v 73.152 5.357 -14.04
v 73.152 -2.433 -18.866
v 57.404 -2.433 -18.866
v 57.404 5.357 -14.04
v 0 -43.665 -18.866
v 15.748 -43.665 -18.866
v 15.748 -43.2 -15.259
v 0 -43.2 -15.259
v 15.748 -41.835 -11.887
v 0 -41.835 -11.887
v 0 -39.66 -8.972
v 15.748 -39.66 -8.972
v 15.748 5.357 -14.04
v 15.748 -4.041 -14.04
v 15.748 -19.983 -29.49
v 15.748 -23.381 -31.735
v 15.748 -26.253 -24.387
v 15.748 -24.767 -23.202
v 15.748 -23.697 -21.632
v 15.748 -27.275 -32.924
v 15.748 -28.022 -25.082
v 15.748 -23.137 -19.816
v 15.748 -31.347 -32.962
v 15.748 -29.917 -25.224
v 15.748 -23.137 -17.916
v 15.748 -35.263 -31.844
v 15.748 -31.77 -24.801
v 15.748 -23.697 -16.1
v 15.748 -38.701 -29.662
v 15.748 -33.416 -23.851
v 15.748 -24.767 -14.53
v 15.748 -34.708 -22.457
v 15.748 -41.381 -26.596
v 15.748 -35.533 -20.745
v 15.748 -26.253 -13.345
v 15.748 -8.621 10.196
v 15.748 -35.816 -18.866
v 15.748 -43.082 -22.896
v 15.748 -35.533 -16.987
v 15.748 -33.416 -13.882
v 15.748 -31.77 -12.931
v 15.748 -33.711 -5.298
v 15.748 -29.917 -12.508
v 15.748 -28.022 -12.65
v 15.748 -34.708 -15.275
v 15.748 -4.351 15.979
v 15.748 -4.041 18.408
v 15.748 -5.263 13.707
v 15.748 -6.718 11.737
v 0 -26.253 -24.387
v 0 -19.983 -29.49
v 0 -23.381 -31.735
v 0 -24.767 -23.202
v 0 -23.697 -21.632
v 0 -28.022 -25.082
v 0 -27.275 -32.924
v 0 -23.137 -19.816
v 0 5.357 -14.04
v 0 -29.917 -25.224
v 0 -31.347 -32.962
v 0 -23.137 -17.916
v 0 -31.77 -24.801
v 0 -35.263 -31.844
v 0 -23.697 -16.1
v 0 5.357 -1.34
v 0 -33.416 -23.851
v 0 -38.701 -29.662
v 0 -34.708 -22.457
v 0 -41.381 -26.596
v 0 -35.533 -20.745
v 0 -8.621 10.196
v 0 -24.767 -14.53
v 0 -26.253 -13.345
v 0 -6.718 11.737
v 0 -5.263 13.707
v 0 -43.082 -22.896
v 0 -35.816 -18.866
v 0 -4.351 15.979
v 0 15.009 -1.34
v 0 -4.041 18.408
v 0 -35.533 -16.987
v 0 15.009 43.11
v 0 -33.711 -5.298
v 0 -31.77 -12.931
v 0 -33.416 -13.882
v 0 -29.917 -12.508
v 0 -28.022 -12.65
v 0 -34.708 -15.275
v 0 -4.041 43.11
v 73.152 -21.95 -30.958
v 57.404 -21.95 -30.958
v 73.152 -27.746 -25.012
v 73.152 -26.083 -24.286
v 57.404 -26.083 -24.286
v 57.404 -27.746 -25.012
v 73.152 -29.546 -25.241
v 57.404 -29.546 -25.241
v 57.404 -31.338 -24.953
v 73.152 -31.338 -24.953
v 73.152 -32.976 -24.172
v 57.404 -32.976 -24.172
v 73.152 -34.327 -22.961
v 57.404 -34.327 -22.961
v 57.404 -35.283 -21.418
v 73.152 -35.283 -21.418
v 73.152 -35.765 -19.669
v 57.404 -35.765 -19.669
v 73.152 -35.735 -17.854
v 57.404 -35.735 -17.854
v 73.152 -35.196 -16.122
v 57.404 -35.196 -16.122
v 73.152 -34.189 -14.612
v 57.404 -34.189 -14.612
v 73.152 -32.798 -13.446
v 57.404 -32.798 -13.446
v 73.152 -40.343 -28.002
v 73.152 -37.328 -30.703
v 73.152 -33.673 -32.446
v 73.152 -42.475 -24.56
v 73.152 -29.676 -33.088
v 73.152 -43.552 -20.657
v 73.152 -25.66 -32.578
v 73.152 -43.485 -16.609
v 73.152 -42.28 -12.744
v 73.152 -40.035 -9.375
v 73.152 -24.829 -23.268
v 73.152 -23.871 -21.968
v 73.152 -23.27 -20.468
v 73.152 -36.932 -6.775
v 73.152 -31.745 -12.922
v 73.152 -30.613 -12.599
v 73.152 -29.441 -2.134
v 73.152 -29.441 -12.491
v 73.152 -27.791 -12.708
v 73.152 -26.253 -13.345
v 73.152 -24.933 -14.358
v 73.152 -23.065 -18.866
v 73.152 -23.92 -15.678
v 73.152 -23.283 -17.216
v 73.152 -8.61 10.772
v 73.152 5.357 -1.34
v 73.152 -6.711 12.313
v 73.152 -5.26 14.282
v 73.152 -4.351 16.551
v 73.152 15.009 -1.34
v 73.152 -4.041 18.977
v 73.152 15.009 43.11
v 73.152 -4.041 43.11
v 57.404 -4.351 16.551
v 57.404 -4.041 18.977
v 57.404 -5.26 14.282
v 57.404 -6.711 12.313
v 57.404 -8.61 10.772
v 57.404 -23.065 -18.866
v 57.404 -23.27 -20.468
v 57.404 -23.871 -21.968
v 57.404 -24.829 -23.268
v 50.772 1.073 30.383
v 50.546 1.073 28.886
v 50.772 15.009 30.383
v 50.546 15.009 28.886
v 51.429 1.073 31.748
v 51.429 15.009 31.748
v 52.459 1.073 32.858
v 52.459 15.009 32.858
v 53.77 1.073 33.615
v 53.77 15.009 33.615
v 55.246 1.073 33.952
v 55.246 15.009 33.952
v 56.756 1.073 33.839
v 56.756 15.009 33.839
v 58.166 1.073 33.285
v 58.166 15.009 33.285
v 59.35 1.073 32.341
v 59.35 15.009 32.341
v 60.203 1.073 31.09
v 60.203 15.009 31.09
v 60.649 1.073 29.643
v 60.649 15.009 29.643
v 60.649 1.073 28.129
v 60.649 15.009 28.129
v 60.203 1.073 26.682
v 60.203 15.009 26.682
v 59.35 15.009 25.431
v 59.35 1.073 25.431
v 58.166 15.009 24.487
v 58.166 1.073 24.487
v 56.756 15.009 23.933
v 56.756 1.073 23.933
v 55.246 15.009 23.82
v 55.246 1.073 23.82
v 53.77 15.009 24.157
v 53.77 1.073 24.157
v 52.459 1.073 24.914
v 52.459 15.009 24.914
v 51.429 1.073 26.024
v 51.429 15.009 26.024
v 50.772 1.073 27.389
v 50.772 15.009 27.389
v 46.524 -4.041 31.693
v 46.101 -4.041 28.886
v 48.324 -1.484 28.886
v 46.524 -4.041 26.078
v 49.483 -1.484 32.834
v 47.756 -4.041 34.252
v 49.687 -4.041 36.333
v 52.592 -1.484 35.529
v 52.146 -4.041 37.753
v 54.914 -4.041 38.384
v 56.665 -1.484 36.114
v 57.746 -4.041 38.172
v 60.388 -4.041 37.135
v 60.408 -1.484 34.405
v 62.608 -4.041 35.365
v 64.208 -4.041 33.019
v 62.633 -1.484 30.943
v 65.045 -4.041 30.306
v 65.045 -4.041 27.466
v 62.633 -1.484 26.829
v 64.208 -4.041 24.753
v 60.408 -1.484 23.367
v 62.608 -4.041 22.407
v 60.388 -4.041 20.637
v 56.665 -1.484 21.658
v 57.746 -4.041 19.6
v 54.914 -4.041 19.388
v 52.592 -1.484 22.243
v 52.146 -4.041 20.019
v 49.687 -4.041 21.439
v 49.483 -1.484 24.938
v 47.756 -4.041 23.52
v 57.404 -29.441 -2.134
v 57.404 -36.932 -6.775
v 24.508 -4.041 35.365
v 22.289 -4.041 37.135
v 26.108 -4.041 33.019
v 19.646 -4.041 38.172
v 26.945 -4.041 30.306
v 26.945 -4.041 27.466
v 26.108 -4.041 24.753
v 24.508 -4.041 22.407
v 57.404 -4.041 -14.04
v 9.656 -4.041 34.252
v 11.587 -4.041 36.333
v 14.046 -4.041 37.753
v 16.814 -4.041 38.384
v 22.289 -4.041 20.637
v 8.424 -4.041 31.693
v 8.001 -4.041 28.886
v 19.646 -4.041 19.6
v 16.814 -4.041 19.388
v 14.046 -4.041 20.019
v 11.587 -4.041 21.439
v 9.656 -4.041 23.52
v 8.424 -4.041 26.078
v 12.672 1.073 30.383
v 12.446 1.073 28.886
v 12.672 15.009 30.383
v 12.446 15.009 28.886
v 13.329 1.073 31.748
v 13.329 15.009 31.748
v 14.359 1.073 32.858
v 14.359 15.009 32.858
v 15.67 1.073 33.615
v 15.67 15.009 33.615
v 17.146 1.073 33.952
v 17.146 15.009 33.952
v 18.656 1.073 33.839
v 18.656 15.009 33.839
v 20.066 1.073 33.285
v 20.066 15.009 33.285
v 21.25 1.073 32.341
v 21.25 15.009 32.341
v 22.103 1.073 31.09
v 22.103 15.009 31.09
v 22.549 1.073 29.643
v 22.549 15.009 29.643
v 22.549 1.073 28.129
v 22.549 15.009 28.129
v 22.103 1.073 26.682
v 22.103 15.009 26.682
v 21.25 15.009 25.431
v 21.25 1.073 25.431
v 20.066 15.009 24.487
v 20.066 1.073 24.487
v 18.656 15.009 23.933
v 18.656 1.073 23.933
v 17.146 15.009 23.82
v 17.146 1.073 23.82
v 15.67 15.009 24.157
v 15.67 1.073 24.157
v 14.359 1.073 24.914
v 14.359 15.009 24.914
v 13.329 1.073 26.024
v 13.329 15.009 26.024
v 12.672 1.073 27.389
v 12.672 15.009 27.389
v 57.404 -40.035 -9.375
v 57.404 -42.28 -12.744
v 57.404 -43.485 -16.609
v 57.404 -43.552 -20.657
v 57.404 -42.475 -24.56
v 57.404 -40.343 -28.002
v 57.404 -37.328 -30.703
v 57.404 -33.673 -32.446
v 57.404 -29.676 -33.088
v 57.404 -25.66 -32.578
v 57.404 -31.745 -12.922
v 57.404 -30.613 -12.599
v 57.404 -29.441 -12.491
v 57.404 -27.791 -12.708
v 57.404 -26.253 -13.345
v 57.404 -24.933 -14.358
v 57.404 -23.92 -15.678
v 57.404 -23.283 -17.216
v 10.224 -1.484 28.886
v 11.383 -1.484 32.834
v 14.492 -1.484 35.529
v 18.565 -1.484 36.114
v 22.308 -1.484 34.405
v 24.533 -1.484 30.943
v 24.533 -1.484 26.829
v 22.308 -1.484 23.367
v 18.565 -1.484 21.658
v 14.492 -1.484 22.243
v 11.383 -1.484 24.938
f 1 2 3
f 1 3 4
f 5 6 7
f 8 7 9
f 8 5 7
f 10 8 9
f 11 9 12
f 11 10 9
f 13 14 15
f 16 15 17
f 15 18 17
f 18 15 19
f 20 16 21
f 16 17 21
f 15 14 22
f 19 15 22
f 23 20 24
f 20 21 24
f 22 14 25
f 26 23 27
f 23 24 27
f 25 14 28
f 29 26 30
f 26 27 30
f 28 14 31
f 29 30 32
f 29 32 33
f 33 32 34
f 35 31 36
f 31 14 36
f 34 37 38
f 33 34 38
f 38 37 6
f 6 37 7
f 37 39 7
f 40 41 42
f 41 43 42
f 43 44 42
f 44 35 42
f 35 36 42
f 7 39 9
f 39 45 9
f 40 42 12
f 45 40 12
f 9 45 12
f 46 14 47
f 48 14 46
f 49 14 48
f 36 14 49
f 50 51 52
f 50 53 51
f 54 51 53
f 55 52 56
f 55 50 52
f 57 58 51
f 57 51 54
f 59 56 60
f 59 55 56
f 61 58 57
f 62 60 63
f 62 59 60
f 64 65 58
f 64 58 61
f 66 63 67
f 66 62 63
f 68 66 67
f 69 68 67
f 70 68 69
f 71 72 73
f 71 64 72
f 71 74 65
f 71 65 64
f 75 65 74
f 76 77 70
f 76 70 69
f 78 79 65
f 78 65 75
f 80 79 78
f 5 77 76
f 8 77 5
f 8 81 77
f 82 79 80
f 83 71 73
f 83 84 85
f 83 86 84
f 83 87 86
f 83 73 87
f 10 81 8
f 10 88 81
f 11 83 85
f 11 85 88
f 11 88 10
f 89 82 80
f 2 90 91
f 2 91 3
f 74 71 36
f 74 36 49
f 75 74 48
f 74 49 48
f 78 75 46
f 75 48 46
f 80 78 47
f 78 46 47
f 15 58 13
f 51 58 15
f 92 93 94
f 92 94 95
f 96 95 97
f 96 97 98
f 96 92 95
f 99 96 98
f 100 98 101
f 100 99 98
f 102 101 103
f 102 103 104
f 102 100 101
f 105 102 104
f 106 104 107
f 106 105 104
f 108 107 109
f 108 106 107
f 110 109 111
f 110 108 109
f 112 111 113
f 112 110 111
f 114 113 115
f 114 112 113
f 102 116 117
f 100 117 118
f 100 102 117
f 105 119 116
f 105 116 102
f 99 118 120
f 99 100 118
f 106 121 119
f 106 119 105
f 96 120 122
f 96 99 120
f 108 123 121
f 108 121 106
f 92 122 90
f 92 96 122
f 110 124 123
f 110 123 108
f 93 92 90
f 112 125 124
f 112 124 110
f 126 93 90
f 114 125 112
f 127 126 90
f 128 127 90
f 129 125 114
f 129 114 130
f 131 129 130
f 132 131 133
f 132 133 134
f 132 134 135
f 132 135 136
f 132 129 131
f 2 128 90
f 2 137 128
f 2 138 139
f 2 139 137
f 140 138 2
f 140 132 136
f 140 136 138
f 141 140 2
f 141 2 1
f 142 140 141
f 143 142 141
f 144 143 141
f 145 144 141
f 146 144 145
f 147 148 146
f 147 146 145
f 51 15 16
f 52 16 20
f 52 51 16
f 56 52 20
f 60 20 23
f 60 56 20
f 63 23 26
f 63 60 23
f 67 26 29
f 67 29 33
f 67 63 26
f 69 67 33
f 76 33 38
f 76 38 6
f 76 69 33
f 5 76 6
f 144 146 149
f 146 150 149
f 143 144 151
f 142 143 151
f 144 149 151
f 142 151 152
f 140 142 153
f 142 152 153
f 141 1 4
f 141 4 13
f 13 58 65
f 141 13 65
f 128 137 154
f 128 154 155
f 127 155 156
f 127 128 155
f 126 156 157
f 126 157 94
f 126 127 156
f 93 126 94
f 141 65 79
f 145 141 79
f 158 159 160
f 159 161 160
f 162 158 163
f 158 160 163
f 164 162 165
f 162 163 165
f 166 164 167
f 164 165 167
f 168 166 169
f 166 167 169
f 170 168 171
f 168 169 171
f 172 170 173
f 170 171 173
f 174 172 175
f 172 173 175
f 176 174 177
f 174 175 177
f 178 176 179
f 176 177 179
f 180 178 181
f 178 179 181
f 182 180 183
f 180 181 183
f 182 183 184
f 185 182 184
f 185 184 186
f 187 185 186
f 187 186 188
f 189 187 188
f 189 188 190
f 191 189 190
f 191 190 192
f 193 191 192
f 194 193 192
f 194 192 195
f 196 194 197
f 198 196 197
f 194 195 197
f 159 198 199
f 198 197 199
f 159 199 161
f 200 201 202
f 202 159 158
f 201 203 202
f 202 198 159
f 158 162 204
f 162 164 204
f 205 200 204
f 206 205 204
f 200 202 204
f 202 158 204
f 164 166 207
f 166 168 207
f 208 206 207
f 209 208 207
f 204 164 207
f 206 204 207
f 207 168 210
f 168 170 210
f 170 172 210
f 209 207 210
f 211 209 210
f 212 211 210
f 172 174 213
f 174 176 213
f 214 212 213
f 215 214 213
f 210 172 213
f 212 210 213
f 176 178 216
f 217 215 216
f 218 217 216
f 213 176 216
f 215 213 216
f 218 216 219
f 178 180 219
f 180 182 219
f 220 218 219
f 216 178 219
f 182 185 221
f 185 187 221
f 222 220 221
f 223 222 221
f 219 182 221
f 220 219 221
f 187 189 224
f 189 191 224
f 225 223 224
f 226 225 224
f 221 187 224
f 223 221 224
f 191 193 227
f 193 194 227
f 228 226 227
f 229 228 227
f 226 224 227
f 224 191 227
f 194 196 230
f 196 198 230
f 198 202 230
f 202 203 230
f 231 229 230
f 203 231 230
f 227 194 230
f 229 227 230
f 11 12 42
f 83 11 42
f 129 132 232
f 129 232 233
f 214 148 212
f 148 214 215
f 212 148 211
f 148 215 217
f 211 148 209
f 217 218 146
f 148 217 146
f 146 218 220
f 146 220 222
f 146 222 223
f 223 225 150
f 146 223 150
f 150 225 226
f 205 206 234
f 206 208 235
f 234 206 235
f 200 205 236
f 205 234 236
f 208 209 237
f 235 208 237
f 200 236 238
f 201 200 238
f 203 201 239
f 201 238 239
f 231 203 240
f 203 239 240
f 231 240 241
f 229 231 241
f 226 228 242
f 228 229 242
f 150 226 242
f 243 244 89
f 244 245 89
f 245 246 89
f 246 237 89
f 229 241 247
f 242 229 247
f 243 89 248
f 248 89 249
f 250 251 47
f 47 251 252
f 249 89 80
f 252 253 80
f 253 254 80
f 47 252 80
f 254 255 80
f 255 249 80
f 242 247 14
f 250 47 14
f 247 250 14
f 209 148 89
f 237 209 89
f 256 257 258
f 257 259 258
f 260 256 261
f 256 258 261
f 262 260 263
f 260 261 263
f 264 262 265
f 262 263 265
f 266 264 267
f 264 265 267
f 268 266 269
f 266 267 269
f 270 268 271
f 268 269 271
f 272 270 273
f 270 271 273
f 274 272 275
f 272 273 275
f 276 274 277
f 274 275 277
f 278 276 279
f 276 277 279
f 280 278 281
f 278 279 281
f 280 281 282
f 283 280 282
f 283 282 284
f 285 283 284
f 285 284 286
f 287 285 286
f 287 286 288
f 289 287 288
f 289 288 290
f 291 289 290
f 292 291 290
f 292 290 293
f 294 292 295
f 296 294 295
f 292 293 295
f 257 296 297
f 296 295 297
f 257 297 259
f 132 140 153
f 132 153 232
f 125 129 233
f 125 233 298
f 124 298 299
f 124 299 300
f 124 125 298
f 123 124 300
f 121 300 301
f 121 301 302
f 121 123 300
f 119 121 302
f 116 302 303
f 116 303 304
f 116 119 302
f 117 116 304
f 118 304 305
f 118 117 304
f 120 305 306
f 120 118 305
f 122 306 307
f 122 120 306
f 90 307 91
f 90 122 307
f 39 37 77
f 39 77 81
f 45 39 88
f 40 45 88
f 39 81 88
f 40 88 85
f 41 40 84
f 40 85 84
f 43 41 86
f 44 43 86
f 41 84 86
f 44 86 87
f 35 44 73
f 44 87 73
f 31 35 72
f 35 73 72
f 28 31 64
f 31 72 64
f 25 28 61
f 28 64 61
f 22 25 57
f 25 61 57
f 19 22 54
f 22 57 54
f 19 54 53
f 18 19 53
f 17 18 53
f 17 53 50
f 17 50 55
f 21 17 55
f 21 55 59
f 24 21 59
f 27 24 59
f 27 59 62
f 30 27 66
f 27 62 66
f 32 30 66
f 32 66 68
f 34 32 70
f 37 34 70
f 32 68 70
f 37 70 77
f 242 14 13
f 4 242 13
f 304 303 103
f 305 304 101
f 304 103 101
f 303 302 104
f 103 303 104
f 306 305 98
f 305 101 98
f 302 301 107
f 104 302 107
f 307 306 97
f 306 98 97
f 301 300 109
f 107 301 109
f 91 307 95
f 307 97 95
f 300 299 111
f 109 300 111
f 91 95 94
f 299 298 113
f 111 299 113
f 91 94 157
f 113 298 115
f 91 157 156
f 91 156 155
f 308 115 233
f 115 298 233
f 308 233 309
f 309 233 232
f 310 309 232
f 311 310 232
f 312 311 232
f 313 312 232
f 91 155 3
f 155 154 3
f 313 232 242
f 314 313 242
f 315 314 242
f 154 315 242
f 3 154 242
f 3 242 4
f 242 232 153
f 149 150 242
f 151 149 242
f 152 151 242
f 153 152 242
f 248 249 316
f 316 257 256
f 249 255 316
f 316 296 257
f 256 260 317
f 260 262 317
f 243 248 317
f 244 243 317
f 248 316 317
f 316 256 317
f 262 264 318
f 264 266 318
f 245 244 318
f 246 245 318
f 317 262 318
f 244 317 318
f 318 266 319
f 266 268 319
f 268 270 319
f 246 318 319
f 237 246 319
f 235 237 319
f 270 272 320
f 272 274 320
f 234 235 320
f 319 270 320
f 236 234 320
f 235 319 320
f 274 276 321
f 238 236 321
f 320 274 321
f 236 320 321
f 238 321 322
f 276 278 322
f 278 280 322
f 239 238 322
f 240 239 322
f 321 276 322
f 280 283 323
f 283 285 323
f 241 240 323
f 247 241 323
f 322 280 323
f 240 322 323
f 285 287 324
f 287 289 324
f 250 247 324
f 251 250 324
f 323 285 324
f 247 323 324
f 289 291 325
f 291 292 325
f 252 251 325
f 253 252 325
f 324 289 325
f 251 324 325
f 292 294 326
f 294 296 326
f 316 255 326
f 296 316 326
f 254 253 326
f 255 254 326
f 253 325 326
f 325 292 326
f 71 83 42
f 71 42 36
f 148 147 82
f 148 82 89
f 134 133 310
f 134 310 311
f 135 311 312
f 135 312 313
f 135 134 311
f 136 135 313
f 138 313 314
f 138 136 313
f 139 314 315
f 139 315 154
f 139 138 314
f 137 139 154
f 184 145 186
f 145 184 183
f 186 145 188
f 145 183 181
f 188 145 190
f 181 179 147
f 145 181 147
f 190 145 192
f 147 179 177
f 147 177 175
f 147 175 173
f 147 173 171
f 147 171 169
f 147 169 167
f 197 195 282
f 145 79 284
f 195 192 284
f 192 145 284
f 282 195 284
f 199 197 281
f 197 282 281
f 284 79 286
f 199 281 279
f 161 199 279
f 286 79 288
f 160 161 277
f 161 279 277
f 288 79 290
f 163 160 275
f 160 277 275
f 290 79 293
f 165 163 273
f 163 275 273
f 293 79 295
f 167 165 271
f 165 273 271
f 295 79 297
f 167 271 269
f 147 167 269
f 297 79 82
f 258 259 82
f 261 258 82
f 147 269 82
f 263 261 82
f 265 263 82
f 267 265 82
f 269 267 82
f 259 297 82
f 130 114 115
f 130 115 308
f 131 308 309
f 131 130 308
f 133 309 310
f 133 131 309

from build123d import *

# Parameters (mm, degrees)
F1_DEPTH       = 73.152
F4_D           = 10.16
F4_CSINK_D     = 19.05
F4_CSINK_ANGLE = 82
F6_DEPTH       = 15.748
F7_R           = 6.3754
F8_DEPTH       = 15.748
F9_R           = 9.652


with BuildPart() as f1:
    # F0 (on Right) → F1 (new body)
    with BuildSketch(Plane.YZ):
        Polygon((15.0091618985, 43.1099530668), (-4.0408381015, 43.1099530668), (-4.0408381015, -14.0400469332), (5.3571618985, -14.0400469332), (5.3571618985, -1.3400469332), (15.0091618985, -1.3400469332), align=None)
    extrude(amount=F1_DEPTH)

    # F4 (through all)
    with Locations(Plane.XZ.offset(4.0408381015)):
        with Locations((17.526, 28.8859530668), (55.626, 28.8859530668)):
            CounterSinkHole(F4_D / 2, F4_CSINK_D / 2, counter_sink_angle=F4_CSINK_ANGLE)

    # F5 (on face) → F6 (join)
    with BuildSketch(Plane.YZ.offset(73.152)):
        with BuildLine():
            Line((-21.9497195355, -30.9575860672), (-2.432565009, -18.8660469332))
            Line((-2.432565009, -18.8660469332), (-15.2168381015, -18.8660469332))
            ThreePointArc((-15.2168381015, -18.8660469332), (-17.0135325512, -25.7858917839), (-21.9497195355, -30.9575860672))
        make_face()
        with BuildLine():
            Line((-29.4408381015, -4.6420469332), (-29.4408381015, -2.1335057937))
            Line((-29.4408381015, -2.1335057937), (-36.9319566675, -6.7745077991))
            ThreePointArc((-36.9319566675, -6.7745077991), (-33.3352009093, -5.1855456879), (-29.4408381015, -4.6420469332))
        make_face()
        with BuildLine():
            Line((-32.7984644588, -13.446446357), (-36.9319566675, -6.7745077991))
            ThreePointArc((-36.9319566675, -6.7745077991), (-41.5323772355, -26.3571654992), (-21.9497195355, -30.9575860672))
            Line((-21.9497195355, -30.9575860672), (-26.0832117442, -24.2856475093))
            ThreePointArc((-26.0832117442, -24.2856475093), (-34.8604386776, -22.2236732904), (-32.7984644588, -13.446446357))
        make_face()
        with BuildLine():
            ThreePointArc((-21.9497195355, -30.9575860672), (-17.0135325512, -25.7858917839), (-15.2168381015, -18.8660469332))
            Line((-15.2168381015, -18.8660469332), (-23.0654381015, -18.8660469332))
            ThreePointArc((-23.0654381015, -18.8660469332), (-23.8707422209, -21.9676202502), (-26.0832117442, -24.2856475093))
            Line((-26.0832117442, -24.2856475093), (-21.9497195355, -30.9575860672))
        make_face()
        with BuildLine():
            Line((-29.4408381015, -12.4906469332), (-29.4408381015, -4.6420469332))
            ThreePointArc((-29.4408381015, -4.6420469332), (-33.3352009093, -5.1855456879), (-36.9319566675, -6.7745077991))
            Line((-36.9319566675, -6.7745077991), (-32.7984644588, -13.446446357))
            ThreePointArc((-32.7984644588, -13.446446357), (-31.1863471457, -12.7342508393), (-29.4408381015, -12.4906469332))
        make_face()
        with BuildLine():
            Line((-4.0408381015, -14.0400469332), (-4.0408381015, 13.602655622))
            Line((-4.0408381015, 13.602655622), (-29.4408381015, -2.1335057937))
            Line((-29.4408381015, -2.1335057937), (-29.4408381015, -4.6420469332))
            ThreePointArc((-29.4408381015, -4.6420469332), (-19.3829512459, -8.8081600776), (-15.2168381015, -18.8660469332))
            Line((-15.2168381015, -18.8660469332), (-2.432565009, -18.8660469332))
            Line((-2.432565009, -18.8660469332), (5.3571618985, -14.0400469332))
            Line((5.3571618985, -14.0400469332), (-4.0408381015, -14.0400469332))
        make_face()
        with BuildLine():
            ThreePointArc((-15.2168381015, -18.8660469332), (-19.3829512459, -8.8081600776), (-29.4408381015, -4.6420469332))
            Line((-29.4408381015, -4.6420469332), (-29.4408381015, -12.4906469332))
            ThreePointArc((-29.4408381015, -12.4906469332), (-24.9327495287, -14.3579583604), (-23.0654381015, -18.8660469332))
            Line((-23.0654381015, -18.8660469332), (-15.2168381015, -18.8660469332))
        make_face()
    extrude(amount=-F6_DEPTH)

    # F7 (on face) → F8 (join)
    with BuildSketch(Plane(origin=(0, 0, 0), x_dir=(0, -1, 0), z_dir=(-1, 0, 0))):
        with BuildLine():
            ThreePointArc((19.9829674828, -29.4901167446), (35.2629264004, -31.8439305757), (43.6648381015, -18.8660469332))
            ThreePointArc((43.6648381015, -18.8660469332), (42.6255838026, -13.5289450231), (39.6596838836, -8.9717371097))
            Line((39.6596838836, -8.9717371097), (33.7111787045, -5.2982038056))
            ThreePointArc((33.7111787045, -5.2982038056), (17.0699133249, -11.8459047572), (19.9829674828, -29.4901167446))
        make_face()
        with Locations((29.4408381015, -18.8660469332)):
            Circle(F7_R, mode=Mode.SUBTRACT)
        with BuildLine():
            Line((-5.3571618985, -14.0400469332), (19.9829674828, -29.4901167446))
            ThreePointArc((19.9829674828, -29.4901167446), (17.0699133249, -11.8459047572), (33.7111787045, -5.2982038056))
            Line((33.7111787045, -5.2982038056), (4.0408381015, 13.0248842761))
            Line((4.0408381015, 13.0248842761), (4.0408381015, -14.0400469332))
            Line((4.0408381015, -14.0400469332), (-5.3571618985, -14.0400469332))
        make_face()
    extrude(amount=-F8_DEPTH)

    # F9
    f9_edges = [f1.edges().sort_by_distance(p)[0] for p in [
        (65.278, -4.040838, 13.602656),
        (7.874, -4.040838, 13.024884),
    ]]
    fillet(f9_edges, radius=F9_R)


solid = f1.part
